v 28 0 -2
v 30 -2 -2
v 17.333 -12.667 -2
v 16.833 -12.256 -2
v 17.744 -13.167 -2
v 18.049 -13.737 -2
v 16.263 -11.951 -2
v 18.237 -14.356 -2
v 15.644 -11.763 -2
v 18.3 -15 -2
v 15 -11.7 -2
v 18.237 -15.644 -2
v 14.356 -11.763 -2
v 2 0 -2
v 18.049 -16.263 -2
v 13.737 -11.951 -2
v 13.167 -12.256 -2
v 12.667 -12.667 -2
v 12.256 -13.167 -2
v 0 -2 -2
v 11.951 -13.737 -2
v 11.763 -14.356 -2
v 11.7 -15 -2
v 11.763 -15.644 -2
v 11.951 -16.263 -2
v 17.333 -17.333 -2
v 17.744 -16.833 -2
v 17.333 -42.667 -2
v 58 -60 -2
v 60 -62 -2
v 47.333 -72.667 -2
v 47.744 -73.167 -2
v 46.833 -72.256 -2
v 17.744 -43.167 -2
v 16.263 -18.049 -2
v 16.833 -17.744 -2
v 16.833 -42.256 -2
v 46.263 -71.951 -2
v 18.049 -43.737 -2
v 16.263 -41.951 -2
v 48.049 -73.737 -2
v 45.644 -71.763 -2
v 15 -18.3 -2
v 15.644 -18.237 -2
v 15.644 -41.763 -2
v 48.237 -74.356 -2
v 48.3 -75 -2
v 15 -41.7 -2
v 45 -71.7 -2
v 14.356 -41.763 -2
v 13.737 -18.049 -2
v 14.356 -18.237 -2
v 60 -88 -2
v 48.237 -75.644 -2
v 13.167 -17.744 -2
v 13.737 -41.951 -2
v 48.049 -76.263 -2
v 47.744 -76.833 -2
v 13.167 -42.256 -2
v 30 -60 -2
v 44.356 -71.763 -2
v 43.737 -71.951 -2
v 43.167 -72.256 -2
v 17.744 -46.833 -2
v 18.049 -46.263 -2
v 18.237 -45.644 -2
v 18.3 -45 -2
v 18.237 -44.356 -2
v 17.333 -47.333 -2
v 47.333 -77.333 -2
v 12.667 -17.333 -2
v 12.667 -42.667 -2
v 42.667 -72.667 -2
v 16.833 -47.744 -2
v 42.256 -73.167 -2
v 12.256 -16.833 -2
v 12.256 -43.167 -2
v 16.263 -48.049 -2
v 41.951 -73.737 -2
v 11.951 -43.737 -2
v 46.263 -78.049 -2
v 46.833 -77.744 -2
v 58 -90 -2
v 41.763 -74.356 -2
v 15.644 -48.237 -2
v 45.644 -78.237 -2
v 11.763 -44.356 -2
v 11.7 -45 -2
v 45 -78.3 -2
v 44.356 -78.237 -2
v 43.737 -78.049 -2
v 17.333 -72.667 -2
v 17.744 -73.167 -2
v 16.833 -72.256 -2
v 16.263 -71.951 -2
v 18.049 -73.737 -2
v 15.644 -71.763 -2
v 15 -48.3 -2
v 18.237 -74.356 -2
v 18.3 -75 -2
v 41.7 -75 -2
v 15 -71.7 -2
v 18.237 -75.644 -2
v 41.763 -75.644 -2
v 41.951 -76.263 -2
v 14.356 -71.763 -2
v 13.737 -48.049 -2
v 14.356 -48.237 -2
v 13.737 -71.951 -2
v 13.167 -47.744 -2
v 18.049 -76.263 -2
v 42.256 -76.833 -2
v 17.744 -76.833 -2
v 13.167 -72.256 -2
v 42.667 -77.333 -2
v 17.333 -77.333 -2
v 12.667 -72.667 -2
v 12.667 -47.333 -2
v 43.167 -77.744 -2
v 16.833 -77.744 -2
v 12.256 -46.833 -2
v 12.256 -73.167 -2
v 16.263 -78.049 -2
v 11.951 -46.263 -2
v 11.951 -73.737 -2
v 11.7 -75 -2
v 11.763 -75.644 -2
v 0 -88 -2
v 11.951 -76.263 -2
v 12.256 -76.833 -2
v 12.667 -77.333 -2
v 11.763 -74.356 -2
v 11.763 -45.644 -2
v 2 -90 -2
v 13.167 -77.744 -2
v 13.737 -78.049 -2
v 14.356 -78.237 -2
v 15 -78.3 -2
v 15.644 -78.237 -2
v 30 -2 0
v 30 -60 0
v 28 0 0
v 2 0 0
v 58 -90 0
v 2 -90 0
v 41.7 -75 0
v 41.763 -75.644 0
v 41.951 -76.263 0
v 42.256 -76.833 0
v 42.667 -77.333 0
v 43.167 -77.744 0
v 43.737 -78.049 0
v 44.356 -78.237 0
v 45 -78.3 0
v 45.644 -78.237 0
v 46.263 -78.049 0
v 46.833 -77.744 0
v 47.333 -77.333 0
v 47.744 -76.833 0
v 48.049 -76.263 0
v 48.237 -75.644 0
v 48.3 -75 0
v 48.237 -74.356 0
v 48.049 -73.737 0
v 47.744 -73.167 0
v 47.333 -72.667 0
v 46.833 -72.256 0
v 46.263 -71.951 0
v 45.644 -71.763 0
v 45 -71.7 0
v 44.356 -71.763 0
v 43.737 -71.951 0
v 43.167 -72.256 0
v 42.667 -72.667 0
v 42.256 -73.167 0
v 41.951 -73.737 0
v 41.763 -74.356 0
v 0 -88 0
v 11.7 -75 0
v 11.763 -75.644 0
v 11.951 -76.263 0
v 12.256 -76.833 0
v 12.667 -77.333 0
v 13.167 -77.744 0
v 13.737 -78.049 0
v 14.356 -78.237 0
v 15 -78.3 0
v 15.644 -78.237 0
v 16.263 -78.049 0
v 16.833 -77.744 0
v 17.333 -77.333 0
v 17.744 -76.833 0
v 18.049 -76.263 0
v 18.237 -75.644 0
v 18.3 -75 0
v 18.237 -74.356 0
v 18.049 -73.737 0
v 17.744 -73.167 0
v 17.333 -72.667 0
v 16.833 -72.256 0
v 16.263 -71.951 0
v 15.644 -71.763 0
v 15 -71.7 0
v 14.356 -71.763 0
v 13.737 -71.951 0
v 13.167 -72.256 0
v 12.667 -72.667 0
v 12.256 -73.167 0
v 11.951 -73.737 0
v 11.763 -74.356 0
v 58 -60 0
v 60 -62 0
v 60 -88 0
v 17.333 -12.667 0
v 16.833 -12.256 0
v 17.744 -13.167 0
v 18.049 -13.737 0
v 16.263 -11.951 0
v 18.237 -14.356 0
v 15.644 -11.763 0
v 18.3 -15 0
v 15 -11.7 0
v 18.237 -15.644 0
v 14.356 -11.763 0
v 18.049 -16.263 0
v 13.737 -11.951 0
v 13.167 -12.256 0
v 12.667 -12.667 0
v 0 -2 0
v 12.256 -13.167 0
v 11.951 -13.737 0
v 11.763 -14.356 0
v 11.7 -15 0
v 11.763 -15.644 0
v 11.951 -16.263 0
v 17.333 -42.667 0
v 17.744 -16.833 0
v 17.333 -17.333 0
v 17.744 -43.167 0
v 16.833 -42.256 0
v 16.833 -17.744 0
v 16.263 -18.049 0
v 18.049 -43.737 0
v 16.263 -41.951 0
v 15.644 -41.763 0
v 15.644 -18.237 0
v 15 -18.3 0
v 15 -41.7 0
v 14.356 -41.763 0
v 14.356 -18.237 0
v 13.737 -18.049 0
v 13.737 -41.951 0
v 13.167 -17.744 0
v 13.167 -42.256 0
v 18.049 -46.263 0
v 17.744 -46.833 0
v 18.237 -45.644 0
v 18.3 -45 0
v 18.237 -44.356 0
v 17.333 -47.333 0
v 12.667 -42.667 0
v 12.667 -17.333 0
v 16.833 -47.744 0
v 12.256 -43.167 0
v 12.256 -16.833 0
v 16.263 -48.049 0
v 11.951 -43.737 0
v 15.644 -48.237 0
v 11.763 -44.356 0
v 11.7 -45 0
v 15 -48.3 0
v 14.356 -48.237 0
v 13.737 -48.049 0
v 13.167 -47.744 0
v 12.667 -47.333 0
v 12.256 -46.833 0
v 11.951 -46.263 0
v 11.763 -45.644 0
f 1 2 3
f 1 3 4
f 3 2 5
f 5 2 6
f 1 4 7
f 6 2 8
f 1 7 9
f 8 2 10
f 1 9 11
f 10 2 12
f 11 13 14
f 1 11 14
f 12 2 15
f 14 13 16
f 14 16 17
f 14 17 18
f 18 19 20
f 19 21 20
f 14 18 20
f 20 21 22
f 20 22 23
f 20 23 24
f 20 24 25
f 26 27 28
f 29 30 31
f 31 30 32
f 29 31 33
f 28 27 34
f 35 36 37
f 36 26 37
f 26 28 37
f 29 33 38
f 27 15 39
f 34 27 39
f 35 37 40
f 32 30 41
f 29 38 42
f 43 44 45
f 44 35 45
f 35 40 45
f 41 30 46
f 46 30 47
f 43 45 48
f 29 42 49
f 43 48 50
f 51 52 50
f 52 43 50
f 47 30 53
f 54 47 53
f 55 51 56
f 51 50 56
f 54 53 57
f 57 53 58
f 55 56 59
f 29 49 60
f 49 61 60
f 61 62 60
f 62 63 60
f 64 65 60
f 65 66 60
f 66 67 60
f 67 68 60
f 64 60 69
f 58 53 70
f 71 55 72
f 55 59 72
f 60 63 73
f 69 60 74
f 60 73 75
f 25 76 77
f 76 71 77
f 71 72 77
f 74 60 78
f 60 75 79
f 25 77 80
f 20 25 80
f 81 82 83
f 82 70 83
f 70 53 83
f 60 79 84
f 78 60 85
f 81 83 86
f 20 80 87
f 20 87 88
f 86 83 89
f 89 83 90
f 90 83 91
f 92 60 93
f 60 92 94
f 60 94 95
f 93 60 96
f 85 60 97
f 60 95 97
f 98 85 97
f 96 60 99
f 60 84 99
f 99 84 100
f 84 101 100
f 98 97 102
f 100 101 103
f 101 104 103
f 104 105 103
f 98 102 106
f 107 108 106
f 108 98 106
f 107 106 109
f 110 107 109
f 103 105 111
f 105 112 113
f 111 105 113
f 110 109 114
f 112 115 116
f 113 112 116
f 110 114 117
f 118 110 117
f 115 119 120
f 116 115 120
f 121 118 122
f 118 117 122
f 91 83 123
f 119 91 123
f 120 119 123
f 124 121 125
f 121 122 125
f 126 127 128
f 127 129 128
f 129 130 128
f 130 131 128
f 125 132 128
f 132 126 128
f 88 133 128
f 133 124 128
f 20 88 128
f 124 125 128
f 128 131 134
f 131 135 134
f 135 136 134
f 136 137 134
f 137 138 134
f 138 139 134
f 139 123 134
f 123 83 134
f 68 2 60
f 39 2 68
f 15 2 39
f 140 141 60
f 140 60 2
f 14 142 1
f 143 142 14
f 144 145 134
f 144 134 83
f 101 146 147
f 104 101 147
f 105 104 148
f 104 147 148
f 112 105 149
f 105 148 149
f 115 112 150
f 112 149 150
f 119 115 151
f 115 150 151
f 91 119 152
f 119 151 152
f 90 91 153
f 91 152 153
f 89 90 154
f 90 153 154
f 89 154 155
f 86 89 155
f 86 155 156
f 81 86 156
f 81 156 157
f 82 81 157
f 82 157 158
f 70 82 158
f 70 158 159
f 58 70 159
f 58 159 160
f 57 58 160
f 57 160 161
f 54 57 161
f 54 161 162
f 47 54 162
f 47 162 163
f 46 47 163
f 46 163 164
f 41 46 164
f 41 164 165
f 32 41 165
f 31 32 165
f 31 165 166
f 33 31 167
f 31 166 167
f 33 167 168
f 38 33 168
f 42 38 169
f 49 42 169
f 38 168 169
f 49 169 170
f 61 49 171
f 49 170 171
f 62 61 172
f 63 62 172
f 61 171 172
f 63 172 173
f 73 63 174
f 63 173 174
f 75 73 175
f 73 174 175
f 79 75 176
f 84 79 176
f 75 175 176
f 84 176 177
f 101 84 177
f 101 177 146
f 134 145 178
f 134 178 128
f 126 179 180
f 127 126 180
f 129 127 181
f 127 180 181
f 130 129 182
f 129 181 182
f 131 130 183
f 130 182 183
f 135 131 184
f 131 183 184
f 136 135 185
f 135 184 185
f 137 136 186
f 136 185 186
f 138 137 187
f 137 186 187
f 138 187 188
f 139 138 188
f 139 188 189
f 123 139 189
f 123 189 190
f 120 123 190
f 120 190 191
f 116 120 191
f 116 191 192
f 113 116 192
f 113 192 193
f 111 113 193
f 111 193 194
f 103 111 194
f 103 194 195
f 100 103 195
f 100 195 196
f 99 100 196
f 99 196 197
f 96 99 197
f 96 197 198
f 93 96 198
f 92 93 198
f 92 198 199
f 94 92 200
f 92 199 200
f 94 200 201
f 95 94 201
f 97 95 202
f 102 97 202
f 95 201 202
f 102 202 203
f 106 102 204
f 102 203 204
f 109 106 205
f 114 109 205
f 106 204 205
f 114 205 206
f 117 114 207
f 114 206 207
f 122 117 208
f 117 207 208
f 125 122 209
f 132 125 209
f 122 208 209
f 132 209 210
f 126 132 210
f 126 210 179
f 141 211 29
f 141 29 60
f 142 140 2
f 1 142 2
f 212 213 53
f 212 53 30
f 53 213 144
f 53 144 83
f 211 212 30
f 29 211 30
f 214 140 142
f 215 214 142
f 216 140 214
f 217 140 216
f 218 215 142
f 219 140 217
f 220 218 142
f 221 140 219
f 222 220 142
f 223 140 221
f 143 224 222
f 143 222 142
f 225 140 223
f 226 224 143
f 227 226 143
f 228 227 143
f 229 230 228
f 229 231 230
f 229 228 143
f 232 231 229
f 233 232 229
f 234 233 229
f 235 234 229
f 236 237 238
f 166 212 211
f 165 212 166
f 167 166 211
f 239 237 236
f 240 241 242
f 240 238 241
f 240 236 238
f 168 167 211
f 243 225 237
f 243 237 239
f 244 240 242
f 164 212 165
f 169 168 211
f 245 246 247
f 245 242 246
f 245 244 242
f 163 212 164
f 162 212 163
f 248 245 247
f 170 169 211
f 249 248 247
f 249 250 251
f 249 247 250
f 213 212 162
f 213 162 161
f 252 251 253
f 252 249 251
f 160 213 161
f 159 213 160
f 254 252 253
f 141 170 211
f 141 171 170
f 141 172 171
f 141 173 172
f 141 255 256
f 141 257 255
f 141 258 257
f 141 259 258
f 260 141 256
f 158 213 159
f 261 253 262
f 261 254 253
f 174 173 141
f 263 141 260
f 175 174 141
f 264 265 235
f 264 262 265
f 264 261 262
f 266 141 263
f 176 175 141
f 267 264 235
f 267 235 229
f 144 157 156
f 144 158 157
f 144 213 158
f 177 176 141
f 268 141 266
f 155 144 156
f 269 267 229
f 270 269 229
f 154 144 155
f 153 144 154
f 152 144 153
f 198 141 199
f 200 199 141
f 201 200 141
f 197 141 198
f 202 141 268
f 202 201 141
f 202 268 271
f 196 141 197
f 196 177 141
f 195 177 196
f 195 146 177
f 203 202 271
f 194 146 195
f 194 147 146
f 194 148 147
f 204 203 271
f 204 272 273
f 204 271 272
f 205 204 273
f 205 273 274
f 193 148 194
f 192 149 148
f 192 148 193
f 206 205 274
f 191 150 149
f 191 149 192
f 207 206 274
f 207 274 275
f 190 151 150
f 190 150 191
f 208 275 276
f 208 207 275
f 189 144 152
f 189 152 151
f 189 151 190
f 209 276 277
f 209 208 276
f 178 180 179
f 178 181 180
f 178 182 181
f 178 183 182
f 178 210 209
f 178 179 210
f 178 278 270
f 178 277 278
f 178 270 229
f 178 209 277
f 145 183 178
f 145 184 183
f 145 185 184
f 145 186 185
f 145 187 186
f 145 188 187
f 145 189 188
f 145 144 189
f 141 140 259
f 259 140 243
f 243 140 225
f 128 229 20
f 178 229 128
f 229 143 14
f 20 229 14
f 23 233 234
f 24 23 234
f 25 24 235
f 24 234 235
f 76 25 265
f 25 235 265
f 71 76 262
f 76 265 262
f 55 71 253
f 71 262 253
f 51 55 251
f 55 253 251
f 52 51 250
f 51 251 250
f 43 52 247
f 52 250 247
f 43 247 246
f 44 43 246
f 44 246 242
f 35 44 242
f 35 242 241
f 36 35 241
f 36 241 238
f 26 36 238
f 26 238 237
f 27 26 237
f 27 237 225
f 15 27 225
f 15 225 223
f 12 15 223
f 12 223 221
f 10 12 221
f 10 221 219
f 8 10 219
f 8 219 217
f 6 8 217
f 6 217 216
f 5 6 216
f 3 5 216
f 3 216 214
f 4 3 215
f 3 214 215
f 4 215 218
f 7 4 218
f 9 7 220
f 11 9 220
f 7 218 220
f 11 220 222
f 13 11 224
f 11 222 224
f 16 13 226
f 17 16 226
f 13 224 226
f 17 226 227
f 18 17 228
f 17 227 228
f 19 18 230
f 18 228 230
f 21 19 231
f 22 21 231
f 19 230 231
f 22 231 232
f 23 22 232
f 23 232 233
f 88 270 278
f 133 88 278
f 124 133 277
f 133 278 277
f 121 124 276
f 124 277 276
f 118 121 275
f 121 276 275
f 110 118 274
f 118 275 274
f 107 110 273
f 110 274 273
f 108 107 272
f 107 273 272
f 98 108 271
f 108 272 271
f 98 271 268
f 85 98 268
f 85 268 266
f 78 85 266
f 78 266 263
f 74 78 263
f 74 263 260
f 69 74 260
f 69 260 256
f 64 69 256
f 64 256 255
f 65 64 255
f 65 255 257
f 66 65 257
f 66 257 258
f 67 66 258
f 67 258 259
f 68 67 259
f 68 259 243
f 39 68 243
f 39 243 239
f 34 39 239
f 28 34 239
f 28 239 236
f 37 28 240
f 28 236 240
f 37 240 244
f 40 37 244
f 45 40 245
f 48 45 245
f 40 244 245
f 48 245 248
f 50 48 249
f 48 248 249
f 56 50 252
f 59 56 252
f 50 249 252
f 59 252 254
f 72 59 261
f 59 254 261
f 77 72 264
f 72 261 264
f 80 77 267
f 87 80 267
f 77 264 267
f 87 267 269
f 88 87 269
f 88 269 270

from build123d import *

# Parameters (mm, degrees)
EXTRUDE_1_DEPTH   = 2
HOLE_WIZARD_M61_D = 6.6
CHAMFER_1_SIZE    = 2


with BuildPart() as part:
    # Эскиз1 → Бобышка-Вытянуть1 (new body)
    with BuildSketch(Plane(origin=(0, 0, 0), x_dir=(1, 0, 0), z_dir=(0, 0, -1))):
        Polygon((0, 0), (0, 90), (60, 90), (60, 60), (30, 60), (30, 0), align=None)
    extrude(amount=EXTRUDE_1_DEPTH)

    # Отверстие с зазором M61 (through all)
    with Locations(Plane(origin=(0, 0, -2), x_dir=(1, 0, 0), z_dir=(0, 0, -1))):
        with Locations((45, 75), (15, 75), (15, 45), (15, 15)):
            Hole(HOLE_WIZARD_M61_D / 2)

    # Фаска1
    chamfer_1_edges = [part.edges().sort_by_distance(p)[0] for p in [
        (0, 0, -1),
        (0, -90, -1),
        (60, -90, -1),
        (60, -60, -1),
        (30, 0, -1),
    ]]
    chamfer(chamfer_1_edges, length=CHAMFER_1_SIZE)


solid = part.part
